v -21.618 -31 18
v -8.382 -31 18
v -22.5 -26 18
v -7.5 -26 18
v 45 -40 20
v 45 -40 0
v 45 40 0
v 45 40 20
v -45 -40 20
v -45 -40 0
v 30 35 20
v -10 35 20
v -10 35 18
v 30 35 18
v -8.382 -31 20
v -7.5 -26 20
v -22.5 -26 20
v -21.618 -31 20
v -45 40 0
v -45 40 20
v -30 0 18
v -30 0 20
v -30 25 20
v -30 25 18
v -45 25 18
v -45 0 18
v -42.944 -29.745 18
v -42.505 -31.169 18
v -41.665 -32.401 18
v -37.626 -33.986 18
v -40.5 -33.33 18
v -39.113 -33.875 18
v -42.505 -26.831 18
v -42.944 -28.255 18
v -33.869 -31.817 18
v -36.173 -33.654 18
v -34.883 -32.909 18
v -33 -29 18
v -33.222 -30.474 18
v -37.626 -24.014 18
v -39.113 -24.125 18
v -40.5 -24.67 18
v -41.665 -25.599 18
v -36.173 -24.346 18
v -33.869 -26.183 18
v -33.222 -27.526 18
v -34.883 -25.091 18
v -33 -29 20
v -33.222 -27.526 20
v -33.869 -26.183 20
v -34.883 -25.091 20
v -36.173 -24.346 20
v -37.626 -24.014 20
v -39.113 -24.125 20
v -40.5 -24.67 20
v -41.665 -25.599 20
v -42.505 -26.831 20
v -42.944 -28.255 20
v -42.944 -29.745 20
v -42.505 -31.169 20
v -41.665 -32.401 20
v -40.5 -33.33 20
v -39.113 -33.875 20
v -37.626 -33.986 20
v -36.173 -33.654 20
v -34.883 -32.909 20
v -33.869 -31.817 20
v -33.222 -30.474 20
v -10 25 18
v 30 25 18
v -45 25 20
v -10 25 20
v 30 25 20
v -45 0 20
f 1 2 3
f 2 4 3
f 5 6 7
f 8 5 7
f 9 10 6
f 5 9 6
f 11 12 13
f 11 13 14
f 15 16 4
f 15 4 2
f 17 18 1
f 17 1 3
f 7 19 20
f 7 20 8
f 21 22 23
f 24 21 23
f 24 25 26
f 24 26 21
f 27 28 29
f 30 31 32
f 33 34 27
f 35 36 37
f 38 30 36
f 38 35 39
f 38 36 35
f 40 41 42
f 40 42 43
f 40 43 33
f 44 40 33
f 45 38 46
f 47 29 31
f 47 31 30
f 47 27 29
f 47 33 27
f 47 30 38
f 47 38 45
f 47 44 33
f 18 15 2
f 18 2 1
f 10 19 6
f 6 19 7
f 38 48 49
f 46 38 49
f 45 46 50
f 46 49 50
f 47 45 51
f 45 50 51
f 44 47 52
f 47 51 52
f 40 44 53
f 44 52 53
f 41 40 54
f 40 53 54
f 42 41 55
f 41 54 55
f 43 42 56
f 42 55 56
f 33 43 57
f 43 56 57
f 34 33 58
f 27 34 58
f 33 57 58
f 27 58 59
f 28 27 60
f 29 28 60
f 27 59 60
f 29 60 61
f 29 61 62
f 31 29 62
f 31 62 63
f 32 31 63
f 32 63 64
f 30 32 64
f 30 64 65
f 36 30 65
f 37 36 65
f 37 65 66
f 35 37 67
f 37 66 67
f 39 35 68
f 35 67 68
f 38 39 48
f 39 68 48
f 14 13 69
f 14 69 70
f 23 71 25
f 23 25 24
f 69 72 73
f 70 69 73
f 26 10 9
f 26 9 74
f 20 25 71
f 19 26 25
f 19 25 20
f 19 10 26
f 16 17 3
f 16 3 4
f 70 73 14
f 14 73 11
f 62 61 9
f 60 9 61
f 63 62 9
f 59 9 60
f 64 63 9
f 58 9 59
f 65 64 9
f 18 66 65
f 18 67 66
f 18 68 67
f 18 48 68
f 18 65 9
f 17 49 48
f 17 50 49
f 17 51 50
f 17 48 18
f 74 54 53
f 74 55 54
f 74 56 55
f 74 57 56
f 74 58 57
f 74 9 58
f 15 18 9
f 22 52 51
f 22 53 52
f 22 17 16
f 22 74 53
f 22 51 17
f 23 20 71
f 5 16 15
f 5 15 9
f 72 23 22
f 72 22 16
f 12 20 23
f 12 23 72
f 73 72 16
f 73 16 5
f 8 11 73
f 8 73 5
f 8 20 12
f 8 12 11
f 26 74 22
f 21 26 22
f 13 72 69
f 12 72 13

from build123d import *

# Parameters (mm, degrees)
ESQUISSE1_W             = 90
ESQUISSE1_H             = 80
BOSS_EXTRU_1_DEPTH      = 20
ESQUISSE2_W             = 40
ESQUISSE2_H             = 10
ENL_V_MAT_EXTRU_1_DEPTH = 2
ENL_V_MAT_EXTRU_2_DEPTH = 2
ESQUISSE4_R             = 5
ENL_V_MAT_EXTRU_3_DEPTH = 2
ESQUISSE5_W             = 15
ESQUISSE5_H             = 25
ENL_V_MAT_EXTRU_4_DEPTH = 2


with BuildPart() as part:
    # Esquisse1 → Boss.-Extru.1 (new body)
    with BuildSketch(Plane.XY):
        Rectangle(ESQUISSE1_W, ESQUISSE1_H)
    extrude(amount=BOSS_EXTRU_1_DEPTH)

    # Esquisse2 → Enlèv. mat.-Extru.1 (cut)
    with BuildSketch(Plane.XY.offset(20)):
        with Locations((10, 30)):
            Rectangle(ESQUISSE2_W, ESQUISSE2_H)
    extrude(amount=-ENL_V_MAT_EXTRU_1_DEPTH, mode=Mode.SUBTRACT)

    # Esquisse3 → Enlèv. mat.-Extru.2 (cut)
    with BuildSketch(Plane.XY.offset(20)):
        Polygon((-8.381634904, -31), (-21.618365096, -31), (-22.5, -26), (-7.5, -26), align=None)
    extrude(amount=-ENL_V_MAT_EXTRU_2_DEPTH, mode=Mode.SUBTRACT)

    # Esquisse4 → Enlèv. mat.-Extru.3 (cut)
    with BuildSketch(Plane.XY.offset(20)):
        with Locations((-38, -29)):
            Circle(ESQUISSE4_R)
    extrude(amount=-ENL_V_MAT_EXTRU_3_DEPTH, mode=Mode.SUBTRACT)

    # Esquisse5 → Enlèv. mat.-Extru.4 (cut)
    with BuildSketch(Plane.XY.offset(20)):
        with Locations((-37.5, 12.5)):
            Rectangle(ESQUISSE5_W, ESQUISSE5_H)
    extrude(amount=-ENL_V_MAT_EXTRU_4_DEPTH, mode=Mode.SUBTRACT)


solid = part.part
